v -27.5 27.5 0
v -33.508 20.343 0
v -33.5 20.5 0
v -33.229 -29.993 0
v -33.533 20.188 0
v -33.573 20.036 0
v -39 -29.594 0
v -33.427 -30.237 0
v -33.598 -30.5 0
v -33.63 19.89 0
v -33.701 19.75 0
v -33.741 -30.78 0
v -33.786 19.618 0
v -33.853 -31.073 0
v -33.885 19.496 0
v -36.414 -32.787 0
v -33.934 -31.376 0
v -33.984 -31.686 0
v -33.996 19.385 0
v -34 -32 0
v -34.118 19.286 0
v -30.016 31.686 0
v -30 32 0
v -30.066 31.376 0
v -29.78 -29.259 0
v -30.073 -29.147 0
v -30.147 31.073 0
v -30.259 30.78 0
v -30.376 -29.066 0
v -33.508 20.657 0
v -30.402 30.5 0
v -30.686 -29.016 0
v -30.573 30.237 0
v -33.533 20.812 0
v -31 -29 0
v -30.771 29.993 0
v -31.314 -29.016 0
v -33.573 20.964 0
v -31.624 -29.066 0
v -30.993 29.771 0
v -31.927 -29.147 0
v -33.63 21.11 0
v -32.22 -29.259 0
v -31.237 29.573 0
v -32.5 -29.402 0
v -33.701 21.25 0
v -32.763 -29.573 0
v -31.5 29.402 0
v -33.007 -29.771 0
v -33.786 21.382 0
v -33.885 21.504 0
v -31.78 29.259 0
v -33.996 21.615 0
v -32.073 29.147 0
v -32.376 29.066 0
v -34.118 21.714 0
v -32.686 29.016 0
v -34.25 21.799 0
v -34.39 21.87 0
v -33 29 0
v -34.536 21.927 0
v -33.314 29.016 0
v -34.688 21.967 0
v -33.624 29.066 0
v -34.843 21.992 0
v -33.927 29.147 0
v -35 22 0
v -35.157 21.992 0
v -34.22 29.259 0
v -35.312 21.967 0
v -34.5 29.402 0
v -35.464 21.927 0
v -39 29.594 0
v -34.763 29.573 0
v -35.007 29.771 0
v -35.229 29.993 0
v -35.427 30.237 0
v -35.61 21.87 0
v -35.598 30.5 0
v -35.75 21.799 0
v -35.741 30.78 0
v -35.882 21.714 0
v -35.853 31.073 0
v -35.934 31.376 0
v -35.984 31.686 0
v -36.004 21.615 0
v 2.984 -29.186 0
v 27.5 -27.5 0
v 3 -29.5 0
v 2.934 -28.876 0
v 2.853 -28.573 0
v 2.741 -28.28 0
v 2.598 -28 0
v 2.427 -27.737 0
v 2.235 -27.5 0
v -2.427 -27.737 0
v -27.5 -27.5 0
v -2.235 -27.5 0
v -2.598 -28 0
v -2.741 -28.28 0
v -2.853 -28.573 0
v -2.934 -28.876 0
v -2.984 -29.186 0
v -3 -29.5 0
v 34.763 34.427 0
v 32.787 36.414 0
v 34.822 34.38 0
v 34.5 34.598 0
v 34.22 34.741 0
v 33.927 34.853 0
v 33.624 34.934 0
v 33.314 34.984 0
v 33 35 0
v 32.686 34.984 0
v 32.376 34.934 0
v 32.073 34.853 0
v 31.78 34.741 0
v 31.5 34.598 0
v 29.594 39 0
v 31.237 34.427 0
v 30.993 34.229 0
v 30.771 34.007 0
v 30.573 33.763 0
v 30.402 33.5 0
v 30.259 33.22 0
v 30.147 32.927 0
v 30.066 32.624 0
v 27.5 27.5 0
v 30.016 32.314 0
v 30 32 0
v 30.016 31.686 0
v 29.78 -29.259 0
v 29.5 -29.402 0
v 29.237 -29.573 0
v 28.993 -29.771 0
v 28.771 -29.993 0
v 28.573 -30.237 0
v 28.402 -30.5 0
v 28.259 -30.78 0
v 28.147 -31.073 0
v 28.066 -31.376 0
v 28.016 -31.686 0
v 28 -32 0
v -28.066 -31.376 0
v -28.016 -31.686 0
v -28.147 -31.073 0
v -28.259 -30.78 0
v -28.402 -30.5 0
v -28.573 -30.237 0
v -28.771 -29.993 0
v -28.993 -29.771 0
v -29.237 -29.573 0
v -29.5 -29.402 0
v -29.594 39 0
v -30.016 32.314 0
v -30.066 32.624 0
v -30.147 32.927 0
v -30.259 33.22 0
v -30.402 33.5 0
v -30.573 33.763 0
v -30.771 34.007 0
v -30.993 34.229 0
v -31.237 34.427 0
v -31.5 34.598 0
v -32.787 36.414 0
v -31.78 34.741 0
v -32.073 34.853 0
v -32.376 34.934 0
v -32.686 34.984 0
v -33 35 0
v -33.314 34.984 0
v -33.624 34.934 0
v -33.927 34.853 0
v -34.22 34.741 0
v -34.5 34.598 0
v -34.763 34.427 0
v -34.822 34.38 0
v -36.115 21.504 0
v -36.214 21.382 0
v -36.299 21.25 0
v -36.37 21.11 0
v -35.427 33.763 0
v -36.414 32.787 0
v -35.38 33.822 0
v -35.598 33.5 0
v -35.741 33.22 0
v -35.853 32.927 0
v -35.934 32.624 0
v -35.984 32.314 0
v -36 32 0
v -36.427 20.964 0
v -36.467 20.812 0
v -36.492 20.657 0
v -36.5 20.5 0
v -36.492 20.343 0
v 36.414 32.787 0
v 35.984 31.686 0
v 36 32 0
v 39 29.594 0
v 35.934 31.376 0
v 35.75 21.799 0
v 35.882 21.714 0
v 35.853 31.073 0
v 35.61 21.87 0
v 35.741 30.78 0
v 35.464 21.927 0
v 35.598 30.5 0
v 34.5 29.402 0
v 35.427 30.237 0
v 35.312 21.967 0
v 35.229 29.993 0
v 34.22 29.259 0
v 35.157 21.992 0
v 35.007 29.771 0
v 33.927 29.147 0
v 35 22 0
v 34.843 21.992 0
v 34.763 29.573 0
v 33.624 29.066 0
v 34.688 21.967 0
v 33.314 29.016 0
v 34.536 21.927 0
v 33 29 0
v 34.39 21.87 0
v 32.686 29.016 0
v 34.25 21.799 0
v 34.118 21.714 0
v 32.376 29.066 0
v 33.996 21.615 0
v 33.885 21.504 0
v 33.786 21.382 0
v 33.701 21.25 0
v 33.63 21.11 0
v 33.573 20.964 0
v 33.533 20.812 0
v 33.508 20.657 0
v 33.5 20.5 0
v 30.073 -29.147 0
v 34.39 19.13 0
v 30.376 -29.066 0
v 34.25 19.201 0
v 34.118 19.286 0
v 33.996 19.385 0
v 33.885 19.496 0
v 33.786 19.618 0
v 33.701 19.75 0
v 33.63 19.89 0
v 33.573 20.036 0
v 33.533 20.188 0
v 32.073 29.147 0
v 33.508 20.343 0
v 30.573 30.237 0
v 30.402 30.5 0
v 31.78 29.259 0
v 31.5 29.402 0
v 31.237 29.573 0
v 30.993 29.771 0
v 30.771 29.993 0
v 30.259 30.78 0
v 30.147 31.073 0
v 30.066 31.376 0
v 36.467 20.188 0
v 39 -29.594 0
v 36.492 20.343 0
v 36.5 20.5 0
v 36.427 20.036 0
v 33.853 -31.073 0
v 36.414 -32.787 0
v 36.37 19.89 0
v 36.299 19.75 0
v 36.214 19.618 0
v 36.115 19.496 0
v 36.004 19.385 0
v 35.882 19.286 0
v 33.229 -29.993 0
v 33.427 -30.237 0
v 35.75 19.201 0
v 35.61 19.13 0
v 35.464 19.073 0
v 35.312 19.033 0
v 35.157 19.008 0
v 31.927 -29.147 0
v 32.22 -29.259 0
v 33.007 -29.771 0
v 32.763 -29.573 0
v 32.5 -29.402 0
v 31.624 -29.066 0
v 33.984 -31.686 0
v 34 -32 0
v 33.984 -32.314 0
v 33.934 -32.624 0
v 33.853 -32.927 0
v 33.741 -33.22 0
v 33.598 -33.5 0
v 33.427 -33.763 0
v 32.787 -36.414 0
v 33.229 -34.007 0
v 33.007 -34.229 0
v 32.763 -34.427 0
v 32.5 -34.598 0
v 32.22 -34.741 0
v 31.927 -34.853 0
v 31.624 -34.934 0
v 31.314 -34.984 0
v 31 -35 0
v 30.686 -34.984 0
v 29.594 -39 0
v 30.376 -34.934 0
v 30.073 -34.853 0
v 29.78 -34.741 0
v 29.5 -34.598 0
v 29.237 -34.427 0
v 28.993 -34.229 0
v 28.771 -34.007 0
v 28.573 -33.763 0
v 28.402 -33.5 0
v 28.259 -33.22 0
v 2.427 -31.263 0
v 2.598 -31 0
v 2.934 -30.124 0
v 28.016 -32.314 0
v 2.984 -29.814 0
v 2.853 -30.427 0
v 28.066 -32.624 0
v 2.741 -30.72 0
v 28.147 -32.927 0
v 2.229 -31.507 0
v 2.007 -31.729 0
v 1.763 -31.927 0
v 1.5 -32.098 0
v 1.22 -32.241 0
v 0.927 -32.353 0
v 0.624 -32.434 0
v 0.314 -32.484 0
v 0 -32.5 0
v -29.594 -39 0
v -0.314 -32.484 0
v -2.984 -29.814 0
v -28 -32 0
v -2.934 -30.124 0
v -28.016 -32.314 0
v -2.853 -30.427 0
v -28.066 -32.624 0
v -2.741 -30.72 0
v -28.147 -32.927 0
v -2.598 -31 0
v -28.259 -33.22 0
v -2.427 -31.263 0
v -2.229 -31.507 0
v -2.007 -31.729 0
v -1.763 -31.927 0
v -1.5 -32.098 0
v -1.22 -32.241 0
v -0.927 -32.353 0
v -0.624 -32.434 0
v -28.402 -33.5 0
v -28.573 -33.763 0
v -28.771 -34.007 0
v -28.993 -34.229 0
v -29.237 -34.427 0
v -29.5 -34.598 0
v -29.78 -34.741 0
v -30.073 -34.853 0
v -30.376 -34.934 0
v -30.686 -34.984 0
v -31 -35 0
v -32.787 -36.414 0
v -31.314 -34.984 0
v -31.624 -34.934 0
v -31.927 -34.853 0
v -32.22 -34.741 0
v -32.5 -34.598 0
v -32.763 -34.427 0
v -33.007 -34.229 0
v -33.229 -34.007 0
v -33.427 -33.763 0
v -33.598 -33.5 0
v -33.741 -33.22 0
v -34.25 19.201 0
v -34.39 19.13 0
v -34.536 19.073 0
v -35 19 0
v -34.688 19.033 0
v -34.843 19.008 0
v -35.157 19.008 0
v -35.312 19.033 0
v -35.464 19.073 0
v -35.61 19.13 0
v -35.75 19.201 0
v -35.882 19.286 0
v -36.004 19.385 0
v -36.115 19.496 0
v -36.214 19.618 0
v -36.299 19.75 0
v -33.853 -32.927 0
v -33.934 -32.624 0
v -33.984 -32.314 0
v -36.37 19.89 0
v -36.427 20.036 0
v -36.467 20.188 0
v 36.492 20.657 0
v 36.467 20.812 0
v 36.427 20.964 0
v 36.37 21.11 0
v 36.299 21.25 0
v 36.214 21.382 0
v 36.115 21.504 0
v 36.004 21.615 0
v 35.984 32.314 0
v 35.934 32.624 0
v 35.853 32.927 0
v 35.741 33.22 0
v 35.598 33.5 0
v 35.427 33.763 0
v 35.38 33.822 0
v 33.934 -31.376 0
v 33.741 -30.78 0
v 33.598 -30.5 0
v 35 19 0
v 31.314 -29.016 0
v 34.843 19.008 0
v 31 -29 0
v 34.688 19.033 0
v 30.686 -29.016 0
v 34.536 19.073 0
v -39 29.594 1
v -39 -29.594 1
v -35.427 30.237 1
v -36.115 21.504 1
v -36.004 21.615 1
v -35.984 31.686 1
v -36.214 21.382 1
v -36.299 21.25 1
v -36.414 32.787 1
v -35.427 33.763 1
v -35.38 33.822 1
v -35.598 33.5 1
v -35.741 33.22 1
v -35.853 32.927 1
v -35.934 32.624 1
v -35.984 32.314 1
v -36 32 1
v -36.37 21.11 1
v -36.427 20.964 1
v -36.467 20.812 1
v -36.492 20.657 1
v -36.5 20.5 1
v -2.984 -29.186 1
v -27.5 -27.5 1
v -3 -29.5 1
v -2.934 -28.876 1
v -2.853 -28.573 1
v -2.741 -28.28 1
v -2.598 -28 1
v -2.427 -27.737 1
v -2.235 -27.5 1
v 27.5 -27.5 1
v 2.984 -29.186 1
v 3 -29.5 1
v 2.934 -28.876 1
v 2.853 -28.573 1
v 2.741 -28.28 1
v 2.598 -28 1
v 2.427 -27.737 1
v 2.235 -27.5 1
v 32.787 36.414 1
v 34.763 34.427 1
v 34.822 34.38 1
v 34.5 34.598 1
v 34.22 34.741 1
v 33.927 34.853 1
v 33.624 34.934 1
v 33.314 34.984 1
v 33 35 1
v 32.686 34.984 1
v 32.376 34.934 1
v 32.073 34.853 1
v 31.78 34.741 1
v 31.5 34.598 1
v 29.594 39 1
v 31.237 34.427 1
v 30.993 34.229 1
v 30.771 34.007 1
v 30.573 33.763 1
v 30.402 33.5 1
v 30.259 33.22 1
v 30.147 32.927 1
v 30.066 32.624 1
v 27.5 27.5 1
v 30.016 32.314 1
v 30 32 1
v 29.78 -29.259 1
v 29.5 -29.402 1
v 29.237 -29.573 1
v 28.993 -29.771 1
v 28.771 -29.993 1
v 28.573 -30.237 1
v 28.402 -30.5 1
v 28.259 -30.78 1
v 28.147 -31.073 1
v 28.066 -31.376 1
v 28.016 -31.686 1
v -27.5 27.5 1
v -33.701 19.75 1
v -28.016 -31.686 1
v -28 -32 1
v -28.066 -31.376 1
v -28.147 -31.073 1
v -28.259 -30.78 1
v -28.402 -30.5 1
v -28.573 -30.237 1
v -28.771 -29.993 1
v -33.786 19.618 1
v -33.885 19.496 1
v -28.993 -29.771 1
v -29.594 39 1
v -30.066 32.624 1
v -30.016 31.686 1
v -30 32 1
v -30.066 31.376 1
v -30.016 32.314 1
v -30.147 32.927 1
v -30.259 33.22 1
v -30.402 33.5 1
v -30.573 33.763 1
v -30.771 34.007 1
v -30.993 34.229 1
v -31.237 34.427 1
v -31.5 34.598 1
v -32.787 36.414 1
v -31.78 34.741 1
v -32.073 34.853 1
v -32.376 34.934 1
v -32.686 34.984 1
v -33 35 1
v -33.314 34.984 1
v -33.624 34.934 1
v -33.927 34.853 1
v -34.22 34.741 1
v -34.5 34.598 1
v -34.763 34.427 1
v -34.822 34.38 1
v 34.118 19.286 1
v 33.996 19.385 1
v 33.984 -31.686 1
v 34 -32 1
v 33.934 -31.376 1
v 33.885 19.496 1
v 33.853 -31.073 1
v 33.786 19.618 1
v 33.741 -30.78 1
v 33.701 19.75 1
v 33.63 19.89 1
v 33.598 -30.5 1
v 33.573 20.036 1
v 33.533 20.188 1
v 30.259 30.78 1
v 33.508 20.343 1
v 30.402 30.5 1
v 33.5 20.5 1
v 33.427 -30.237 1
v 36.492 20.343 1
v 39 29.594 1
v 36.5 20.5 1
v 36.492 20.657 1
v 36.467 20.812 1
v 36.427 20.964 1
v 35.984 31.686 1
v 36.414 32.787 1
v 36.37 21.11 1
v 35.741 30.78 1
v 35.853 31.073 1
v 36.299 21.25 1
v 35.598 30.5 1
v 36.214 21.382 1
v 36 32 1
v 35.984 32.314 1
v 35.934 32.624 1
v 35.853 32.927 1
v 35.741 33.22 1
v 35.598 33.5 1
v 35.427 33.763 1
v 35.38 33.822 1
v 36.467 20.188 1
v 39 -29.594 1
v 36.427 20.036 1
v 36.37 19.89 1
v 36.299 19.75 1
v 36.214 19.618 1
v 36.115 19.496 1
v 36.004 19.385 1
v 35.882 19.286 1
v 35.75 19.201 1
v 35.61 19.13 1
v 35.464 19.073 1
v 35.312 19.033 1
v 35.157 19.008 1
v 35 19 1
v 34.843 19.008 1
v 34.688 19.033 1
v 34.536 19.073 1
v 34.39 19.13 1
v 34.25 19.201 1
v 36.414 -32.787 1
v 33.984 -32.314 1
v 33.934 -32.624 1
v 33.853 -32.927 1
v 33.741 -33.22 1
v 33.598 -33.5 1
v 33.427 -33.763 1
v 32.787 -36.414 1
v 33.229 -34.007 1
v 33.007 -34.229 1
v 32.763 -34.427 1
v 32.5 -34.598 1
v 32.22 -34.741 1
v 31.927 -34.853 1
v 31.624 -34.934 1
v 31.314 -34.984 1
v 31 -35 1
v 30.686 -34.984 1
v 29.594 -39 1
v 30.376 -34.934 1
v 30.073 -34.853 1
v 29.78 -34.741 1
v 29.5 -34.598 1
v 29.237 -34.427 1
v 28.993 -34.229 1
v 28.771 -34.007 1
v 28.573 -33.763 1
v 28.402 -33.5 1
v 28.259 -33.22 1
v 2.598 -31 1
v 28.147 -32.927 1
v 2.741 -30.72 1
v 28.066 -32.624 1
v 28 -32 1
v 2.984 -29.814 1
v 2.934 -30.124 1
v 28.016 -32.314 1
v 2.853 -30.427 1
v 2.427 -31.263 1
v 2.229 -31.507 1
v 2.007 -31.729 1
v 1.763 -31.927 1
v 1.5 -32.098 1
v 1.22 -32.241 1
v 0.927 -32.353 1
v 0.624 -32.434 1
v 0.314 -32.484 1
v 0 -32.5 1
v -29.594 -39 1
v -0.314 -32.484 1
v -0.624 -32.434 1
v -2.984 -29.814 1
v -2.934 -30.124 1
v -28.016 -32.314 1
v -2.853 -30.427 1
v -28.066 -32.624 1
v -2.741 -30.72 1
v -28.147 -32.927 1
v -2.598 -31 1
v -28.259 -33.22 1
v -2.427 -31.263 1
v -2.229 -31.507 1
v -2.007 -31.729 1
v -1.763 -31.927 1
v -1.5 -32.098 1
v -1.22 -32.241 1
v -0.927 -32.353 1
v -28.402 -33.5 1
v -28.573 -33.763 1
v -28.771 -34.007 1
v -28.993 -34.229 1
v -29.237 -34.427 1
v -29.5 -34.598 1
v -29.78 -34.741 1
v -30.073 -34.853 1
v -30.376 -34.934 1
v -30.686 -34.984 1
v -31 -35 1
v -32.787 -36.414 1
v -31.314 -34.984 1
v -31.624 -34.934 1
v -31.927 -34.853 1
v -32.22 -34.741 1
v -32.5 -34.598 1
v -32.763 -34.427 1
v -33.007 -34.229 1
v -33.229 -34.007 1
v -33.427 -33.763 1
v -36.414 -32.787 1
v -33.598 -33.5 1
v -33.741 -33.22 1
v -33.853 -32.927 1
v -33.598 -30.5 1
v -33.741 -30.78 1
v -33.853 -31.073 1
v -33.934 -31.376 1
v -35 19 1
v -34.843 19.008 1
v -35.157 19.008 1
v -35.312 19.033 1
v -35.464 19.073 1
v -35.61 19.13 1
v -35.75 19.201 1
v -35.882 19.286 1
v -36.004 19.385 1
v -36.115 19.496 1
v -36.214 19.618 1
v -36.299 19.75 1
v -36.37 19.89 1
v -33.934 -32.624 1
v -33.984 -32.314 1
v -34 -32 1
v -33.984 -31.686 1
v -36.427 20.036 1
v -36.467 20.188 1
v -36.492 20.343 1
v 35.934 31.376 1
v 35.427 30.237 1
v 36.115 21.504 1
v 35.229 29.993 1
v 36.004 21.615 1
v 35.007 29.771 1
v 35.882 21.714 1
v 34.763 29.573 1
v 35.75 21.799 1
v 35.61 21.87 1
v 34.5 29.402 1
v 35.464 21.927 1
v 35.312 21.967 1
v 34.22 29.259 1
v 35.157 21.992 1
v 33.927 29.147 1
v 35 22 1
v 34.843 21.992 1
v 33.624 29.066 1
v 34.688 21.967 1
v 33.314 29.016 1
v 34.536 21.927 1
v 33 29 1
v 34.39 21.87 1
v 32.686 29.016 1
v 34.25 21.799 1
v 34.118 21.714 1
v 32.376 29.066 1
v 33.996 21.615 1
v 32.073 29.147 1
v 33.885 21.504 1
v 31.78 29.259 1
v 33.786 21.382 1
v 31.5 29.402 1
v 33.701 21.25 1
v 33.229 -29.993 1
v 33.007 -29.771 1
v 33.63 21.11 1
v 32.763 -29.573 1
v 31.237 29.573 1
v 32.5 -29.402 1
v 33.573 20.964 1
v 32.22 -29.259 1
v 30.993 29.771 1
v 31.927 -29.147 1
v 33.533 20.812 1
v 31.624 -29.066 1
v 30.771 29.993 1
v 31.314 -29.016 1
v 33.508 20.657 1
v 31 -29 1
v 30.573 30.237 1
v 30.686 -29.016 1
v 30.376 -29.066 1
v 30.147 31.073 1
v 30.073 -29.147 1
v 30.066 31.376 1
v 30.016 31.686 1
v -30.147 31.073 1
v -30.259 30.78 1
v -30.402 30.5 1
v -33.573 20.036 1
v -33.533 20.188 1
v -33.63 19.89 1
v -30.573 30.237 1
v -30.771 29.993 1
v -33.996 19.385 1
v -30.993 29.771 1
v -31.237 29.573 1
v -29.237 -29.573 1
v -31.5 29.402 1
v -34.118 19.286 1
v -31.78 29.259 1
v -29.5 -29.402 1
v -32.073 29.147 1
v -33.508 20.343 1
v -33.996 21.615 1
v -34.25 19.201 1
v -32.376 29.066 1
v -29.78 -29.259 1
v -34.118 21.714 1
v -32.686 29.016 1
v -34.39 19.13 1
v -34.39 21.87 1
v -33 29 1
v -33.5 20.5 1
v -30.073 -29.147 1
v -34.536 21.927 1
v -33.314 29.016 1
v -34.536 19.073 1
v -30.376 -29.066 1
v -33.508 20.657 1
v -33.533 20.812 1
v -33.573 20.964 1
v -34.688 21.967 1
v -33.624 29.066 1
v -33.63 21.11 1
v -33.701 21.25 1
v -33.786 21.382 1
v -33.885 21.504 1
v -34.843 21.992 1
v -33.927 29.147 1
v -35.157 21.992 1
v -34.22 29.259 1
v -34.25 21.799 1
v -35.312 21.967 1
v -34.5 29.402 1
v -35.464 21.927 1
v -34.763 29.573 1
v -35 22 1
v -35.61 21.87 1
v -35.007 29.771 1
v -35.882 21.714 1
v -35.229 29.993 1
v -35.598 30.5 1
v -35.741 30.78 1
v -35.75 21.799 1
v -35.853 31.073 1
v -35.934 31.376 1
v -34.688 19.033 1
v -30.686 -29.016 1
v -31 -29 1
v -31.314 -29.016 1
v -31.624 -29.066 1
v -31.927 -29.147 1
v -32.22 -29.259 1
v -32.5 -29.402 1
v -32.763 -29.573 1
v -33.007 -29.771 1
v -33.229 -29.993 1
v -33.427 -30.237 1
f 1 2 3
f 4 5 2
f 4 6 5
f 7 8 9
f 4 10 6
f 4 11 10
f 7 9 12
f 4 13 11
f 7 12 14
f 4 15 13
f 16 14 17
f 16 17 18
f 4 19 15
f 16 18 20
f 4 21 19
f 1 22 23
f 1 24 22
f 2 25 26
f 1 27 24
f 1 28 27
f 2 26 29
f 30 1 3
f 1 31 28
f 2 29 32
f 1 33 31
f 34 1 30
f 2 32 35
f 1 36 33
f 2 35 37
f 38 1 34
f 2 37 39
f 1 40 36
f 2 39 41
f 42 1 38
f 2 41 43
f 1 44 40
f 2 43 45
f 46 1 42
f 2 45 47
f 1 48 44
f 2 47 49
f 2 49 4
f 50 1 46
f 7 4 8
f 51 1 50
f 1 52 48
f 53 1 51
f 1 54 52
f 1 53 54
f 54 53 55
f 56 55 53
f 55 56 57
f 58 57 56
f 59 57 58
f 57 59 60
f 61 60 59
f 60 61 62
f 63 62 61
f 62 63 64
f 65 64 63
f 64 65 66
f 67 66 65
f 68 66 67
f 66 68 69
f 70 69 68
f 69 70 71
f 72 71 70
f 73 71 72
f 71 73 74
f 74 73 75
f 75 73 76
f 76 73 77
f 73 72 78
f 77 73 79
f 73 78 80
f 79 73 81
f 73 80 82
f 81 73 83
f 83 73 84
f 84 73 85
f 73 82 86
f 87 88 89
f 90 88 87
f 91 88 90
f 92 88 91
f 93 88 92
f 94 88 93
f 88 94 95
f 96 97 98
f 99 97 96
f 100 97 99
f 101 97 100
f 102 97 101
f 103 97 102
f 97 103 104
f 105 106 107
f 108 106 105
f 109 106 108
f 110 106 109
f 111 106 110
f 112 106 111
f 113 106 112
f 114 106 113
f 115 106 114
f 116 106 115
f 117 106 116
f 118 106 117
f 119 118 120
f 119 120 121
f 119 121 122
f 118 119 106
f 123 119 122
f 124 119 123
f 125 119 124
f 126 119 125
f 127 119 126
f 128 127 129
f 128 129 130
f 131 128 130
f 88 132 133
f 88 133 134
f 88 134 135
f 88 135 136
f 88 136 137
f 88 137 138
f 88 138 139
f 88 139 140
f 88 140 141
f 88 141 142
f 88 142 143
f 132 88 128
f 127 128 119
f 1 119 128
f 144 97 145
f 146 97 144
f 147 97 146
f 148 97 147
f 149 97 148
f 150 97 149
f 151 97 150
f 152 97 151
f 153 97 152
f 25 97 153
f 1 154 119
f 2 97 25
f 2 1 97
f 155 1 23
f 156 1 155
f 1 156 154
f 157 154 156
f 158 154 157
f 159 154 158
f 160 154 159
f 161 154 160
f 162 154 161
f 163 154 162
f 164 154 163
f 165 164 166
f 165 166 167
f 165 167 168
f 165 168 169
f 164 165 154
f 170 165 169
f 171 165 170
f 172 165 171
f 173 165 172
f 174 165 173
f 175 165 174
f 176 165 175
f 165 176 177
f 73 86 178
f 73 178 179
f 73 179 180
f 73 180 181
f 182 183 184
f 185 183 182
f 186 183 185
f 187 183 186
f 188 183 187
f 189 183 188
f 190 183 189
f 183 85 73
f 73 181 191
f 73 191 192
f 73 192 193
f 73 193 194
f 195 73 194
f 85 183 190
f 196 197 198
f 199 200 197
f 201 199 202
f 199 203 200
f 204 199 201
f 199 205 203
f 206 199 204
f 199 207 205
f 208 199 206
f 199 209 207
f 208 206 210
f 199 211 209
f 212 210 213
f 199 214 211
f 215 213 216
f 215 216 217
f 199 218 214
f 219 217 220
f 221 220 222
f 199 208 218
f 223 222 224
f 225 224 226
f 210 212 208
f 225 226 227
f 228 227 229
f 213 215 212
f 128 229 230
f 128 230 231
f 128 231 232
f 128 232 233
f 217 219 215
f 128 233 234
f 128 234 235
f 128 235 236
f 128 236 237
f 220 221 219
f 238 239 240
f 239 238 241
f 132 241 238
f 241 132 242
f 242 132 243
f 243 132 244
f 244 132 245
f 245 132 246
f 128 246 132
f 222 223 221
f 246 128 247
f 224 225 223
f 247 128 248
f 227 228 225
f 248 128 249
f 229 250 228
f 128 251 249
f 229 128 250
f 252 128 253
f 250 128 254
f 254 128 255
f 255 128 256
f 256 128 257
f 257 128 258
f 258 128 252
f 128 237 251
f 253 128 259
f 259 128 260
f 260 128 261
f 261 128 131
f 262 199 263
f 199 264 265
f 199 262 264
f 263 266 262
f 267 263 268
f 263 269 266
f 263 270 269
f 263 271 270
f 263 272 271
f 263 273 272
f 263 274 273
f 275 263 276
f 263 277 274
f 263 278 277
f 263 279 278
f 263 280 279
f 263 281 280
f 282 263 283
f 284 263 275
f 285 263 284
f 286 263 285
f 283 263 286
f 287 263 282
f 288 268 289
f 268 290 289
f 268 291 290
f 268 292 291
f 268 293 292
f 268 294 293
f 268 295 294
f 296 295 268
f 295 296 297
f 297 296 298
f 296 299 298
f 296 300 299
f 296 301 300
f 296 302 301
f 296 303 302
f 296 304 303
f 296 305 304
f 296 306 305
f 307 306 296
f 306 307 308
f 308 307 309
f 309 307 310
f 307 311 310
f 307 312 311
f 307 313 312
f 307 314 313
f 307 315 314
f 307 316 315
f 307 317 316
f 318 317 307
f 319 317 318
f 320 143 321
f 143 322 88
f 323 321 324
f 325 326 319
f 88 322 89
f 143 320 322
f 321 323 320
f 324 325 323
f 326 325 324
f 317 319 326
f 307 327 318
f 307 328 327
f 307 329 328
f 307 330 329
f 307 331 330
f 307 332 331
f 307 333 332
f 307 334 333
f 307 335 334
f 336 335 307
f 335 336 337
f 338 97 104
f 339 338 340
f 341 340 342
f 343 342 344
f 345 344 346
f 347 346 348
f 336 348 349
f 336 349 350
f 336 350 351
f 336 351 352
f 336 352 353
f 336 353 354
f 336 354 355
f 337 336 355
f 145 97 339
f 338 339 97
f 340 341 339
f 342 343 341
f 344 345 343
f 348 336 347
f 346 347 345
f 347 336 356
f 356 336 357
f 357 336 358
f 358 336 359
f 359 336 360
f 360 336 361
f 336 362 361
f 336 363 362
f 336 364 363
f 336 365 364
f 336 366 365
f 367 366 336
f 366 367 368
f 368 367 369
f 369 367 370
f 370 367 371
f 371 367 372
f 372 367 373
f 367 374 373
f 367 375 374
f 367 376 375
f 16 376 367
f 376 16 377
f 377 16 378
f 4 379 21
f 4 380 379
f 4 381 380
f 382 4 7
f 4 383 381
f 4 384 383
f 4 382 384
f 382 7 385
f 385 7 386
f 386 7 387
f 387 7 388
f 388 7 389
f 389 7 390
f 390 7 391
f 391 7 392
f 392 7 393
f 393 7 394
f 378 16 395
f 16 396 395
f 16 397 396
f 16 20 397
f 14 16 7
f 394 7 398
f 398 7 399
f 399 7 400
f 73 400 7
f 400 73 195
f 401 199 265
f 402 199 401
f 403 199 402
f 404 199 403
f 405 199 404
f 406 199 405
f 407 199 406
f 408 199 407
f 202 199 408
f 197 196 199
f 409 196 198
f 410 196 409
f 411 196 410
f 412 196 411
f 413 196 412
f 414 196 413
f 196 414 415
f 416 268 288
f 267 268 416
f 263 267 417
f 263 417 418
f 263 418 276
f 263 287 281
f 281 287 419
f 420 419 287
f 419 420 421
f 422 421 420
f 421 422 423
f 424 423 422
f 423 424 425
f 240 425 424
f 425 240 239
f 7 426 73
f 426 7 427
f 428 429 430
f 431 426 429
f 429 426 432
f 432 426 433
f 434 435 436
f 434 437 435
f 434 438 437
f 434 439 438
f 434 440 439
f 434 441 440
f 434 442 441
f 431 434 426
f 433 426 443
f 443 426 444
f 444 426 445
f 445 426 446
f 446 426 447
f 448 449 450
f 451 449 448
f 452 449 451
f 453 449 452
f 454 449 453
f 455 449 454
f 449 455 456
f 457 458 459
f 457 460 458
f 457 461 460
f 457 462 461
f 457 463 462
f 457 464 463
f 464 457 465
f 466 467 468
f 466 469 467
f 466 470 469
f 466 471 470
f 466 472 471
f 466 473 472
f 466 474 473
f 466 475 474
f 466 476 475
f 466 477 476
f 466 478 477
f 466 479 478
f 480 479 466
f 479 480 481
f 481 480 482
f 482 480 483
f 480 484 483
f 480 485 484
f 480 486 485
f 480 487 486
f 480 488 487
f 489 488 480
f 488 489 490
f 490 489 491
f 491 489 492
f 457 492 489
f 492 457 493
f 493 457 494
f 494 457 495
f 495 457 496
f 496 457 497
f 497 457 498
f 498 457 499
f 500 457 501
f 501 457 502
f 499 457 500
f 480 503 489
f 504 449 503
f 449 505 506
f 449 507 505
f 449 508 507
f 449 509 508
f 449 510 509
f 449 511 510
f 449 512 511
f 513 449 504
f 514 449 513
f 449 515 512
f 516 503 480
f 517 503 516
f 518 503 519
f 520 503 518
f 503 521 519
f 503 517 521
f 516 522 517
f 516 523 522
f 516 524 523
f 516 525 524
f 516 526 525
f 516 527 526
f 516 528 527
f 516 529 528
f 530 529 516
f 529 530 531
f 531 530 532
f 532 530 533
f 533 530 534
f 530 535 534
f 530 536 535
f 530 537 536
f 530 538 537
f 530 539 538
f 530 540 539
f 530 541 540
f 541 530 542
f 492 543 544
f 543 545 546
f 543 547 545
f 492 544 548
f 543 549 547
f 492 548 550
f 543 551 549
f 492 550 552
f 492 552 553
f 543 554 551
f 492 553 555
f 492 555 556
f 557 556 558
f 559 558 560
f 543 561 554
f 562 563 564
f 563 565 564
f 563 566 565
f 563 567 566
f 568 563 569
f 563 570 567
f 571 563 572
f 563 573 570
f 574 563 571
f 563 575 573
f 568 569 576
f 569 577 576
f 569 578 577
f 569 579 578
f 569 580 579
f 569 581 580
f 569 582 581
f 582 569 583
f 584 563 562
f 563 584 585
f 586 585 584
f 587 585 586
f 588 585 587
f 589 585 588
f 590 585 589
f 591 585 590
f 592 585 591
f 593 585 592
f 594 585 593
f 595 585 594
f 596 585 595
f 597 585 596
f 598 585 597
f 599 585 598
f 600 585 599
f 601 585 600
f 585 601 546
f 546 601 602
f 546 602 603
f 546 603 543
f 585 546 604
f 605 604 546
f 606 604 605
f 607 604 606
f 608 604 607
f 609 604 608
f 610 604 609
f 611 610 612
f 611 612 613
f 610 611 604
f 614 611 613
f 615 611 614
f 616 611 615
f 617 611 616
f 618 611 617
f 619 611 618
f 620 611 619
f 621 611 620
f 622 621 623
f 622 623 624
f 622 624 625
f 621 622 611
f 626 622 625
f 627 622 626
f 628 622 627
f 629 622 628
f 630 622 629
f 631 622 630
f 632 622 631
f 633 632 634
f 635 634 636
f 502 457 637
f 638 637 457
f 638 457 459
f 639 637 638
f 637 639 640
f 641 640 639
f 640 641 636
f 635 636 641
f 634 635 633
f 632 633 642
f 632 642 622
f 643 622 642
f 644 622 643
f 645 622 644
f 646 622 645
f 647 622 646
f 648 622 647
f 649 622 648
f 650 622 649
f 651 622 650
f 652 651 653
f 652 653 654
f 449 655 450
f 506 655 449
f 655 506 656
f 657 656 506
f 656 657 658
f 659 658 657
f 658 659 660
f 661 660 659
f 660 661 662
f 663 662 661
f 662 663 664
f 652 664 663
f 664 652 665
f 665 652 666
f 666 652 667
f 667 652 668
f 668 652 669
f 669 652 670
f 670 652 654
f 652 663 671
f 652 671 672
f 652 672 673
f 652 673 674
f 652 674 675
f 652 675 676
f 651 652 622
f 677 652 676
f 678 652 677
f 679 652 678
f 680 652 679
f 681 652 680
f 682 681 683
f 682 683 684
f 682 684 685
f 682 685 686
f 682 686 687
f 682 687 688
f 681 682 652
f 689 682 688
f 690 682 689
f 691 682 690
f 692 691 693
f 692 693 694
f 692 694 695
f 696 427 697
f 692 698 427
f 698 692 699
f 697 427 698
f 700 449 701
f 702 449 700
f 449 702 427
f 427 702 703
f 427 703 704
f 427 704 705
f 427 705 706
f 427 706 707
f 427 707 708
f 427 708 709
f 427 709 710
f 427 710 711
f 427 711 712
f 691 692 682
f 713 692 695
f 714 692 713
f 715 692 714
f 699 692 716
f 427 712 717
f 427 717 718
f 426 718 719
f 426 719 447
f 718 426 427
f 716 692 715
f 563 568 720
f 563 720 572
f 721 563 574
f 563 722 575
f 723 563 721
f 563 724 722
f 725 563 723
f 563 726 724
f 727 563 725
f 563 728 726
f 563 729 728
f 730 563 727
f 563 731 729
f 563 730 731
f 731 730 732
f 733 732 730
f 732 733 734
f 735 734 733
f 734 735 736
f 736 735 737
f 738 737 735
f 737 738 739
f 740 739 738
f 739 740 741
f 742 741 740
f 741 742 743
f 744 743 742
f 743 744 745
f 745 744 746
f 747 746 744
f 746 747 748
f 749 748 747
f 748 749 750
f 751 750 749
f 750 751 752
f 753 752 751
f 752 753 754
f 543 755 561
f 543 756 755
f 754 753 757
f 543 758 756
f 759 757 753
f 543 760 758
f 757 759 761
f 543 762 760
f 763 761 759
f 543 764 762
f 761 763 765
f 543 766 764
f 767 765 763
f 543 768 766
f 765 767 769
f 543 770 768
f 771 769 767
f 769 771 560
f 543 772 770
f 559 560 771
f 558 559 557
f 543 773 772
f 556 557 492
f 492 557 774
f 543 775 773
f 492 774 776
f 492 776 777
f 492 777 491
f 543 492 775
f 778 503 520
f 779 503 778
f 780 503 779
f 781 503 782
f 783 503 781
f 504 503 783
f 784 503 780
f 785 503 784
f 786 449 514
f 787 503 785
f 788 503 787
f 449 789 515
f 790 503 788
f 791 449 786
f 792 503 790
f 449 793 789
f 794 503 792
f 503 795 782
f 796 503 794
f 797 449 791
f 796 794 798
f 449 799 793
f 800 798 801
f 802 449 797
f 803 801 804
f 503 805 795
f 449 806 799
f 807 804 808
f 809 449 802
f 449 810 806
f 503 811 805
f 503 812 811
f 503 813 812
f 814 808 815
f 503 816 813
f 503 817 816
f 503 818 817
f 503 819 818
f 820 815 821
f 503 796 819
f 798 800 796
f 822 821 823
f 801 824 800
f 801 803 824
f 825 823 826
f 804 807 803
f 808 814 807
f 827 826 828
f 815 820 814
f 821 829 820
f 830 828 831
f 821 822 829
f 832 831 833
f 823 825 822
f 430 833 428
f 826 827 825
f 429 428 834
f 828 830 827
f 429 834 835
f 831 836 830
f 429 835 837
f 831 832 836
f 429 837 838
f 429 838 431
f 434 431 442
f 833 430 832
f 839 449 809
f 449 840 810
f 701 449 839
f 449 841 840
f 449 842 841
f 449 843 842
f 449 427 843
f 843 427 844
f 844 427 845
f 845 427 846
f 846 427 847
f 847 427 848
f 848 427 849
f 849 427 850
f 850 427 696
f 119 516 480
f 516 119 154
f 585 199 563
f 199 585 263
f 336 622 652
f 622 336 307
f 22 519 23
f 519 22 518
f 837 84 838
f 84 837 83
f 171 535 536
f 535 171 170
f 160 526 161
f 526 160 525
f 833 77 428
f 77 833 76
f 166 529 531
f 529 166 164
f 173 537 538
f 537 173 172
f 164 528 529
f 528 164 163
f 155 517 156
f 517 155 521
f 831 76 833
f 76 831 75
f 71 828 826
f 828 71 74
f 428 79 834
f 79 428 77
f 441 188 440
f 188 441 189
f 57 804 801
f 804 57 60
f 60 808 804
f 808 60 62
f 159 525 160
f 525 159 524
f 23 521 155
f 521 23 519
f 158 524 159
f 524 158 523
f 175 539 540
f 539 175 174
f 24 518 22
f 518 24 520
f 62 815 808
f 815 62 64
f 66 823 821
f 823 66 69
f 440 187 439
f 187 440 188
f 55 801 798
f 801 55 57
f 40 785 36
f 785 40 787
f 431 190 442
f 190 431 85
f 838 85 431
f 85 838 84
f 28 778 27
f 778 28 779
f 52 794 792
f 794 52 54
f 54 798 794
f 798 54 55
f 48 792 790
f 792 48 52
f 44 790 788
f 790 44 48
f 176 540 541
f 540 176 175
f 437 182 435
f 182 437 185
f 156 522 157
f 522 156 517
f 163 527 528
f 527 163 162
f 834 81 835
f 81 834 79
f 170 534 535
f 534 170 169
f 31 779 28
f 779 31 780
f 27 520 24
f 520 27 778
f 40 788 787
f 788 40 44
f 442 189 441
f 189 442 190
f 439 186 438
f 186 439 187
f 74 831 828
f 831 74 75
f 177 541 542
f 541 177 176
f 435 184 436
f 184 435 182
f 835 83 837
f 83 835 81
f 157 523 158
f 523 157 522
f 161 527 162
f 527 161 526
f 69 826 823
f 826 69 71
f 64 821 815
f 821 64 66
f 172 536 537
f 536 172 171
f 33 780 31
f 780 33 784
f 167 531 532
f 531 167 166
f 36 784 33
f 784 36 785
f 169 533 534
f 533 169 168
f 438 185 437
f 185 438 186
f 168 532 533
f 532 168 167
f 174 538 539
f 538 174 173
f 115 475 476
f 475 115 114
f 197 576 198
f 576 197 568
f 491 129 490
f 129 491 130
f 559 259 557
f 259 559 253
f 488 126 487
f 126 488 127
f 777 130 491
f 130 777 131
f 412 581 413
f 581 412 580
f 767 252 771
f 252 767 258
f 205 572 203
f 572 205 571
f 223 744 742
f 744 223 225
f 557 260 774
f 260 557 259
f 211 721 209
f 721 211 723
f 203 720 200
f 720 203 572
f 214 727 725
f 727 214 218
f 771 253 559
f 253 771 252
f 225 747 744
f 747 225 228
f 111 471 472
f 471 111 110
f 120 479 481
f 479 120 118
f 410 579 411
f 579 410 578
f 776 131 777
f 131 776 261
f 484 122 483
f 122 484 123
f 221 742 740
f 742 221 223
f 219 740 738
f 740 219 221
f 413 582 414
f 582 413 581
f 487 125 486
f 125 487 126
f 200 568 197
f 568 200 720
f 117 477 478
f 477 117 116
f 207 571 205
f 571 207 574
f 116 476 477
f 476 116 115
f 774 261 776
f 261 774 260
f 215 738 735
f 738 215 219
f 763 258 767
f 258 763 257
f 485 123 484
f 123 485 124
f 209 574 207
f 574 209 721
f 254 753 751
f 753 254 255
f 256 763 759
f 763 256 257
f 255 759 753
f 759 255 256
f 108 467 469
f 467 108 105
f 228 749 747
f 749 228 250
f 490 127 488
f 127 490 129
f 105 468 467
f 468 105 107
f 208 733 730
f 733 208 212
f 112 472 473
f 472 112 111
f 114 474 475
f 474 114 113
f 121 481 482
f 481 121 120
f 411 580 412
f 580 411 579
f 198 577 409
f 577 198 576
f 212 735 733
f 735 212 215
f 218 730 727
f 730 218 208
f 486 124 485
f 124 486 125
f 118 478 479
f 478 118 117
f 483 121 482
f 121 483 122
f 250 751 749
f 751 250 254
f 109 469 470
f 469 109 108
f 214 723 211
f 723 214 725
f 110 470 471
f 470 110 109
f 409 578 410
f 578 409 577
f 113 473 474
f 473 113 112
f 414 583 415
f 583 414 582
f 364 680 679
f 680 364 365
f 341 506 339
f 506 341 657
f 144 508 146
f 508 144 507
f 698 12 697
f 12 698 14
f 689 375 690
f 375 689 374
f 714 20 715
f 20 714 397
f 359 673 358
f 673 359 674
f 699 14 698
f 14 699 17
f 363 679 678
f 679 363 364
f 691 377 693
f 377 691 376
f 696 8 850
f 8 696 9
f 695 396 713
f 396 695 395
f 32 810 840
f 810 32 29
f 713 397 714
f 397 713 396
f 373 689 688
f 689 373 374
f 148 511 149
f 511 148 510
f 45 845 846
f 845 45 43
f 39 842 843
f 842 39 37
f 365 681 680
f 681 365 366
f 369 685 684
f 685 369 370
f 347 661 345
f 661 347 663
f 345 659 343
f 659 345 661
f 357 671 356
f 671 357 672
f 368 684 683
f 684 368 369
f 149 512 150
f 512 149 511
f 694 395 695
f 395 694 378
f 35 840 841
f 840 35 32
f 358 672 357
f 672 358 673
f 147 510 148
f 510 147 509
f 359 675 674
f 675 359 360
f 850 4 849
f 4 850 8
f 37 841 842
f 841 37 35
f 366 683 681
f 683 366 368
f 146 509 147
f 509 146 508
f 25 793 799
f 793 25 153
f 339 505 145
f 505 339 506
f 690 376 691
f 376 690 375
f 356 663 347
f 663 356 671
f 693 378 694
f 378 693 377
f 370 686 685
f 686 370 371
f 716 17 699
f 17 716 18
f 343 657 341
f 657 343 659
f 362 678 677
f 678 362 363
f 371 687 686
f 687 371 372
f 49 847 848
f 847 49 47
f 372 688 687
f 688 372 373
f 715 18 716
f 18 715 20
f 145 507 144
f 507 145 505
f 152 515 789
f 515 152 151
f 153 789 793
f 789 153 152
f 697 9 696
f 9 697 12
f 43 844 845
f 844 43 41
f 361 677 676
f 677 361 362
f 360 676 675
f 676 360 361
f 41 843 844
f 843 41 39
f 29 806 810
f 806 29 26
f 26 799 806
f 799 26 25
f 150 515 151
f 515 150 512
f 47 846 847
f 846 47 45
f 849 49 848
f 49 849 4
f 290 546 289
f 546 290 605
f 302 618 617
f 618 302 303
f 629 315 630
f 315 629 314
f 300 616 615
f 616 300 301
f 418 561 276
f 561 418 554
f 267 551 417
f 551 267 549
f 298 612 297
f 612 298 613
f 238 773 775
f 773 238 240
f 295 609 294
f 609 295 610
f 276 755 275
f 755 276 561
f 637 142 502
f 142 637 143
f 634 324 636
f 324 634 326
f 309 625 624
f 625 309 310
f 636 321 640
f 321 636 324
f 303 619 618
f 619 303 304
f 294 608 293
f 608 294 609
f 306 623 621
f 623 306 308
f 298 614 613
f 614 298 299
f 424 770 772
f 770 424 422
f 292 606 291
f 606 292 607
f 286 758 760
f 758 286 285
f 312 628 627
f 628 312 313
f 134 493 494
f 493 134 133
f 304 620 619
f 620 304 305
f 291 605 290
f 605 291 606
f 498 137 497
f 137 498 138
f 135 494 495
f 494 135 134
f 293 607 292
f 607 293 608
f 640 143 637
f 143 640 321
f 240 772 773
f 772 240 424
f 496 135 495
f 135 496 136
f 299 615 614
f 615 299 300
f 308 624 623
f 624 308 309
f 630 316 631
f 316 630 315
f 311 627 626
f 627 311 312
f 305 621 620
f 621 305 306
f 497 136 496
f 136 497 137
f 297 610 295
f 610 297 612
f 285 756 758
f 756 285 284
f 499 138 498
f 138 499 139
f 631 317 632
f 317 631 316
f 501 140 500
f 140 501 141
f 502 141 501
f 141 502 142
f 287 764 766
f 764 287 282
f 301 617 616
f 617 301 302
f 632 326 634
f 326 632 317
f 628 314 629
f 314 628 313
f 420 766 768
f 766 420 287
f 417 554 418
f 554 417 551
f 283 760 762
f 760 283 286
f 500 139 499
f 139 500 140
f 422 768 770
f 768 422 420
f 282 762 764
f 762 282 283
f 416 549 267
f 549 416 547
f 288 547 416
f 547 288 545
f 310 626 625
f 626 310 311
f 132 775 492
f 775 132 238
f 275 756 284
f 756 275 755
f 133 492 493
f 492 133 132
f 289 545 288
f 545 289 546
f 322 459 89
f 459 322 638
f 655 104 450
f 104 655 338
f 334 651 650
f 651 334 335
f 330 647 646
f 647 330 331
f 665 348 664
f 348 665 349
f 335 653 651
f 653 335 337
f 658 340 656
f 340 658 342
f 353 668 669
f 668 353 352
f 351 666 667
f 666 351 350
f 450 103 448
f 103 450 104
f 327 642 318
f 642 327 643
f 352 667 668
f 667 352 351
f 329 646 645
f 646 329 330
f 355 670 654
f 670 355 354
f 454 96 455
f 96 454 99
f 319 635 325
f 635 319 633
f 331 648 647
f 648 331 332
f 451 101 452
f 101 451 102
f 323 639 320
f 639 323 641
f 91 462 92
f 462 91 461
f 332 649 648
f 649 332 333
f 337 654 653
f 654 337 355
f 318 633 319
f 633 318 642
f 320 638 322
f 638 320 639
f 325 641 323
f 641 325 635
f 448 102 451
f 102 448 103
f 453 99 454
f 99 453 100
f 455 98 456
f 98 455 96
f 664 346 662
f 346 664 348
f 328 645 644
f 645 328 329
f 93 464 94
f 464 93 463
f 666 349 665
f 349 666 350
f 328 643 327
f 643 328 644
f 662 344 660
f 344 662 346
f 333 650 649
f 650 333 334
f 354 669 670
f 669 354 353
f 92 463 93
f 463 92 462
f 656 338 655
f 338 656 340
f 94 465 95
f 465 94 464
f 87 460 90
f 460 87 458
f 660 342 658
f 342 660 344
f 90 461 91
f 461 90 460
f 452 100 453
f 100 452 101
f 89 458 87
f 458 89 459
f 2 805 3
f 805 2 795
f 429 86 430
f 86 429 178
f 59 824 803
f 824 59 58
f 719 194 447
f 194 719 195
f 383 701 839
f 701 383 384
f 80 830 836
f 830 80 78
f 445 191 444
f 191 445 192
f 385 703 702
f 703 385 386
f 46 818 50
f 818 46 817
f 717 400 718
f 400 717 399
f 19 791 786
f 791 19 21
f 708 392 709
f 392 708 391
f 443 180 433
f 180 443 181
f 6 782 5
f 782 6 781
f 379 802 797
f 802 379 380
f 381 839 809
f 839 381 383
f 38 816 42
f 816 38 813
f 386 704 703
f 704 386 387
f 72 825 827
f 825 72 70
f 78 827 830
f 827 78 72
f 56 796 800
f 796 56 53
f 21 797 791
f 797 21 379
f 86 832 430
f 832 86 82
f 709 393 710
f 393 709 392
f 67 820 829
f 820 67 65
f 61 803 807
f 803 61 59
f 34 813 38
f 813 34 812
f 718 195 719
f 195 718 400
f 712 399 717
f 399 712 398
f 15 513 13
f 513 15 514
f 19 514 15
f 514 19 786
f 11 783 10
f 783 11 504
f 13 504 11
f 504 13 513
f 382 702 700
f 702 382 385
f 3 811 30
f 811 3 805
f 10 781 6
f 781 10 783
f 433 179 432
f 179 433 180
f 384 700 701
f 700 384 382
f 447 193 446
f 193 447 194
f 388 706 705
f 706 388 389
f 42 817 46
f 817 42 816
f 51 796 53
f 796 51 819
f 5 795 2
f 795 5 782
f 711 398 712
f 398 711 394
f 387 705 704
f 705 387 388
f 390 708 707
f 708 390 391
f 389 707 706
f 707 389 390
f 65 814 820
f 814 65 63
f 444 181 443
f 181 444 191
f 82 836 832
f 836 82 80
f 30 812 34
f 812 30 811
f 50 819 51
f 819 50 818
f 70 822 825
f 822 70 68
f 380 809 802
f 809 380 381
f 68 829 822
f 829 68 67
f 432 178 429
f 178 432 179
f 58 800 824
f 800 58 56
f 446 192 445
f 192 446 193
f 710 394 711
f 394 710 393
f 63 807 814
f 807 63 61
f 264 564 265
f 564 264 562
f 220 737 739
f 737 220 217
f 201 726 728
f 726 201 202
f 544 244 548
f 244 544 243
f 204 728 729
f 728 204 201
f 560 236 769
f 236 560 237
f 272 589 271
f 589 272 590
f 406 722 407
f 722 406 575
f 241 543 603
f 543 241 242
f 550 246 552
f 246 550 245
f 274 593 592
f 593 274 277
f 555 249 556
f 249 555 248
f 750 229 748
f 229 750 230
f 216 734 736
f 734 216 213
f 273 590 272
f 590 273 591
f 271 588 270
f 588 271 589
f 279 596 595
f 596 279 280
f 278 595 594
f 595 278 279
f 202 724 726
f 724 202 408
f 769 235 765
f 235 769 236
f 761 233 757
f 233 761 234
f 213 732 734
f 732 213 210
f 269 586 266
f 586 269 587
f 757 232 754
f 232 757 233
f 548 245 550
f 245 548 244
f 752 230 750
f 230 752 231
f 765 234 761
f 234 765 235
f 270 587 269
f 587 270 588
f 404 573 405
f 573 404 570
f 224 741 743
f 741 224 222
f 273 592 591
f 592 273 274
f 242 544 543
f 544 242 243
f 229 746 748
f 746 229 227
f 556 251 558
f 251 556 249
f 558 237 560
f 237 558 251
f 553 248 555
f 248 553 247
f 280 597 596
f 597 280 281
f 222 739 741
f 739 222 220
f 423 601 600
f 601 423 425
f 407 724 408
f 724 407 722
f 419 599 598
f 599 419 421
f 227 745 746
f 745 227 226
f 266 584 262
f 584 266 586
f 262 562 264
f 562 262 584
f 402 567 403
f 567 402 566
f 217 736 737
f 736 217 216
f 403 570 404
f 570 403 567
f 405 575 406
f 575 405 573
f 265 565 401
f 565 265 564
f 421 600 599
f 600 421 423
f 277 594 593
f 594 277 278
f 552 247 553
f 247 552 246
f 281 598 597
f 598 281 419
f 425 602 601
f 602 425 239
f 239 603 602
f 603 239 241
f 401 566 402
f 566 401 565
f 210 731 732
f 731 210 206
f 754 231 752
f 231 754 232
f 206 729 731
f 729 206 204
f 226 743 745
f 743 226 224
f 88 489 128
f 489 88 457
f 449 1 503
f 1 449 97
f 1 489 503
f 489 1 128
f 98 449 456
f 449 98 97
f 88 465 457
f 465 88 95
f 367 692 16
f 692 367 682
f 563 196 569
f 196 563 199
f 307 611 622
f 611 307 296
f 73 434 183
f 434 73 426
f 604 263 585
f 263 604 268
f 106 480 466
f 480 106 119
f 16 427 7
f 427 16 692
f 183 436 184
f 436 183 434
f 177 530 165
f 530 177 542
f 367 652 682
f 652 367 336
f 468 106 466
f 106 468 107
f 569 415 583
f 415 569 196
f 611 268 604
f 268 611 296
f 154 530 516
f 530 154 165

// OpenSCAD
$fn=60;

led_board_radius=5.05;
led_board_height=1;

board_radius=78/2;
board_height=1;

through_hole_radius=3;
screw_hole_radius=1.5;

intersection() {
  difference() {
    // The basic square for the 'board'
    linear_extrude(board_height) square(board_radius*2, center=true);
    
    // Subtract out the led holes
    *union() {
      sectors = 24;
      sector_degrees = 360 / sectors;
      for(sector = [1 : sectors]) {
        angle = sector_degrees * (sector+0.5);
        // Polar equ for 'squircle', awesome: https://thatsmaths.com/2016/07/14/squircles/
        radius = (1 + 1/8 * sin(2*angle)*sin(2*angle)) * (board_radius-led_board_radius);
        
        rotate([0, 0, angle])
          translate([radius, 0, -1])
          led_board();
      }
    }

    // Subtract out the inner circle
    translate([0, 0, -1]) 
      linear_extrude(board_height+2)
      circle(board_radius-15);
  
    // top left through hole
    translate([
        -(board_radius-(3+through_hole_radius)), 
        (board_radius-(4+through_hole_radius)),
        -1]) 
      linear_extrude(board_height+2)
      circle(through_hole_radius);
    // top right through hole
    translate([
        (board_radius-(3+through_hole_radius)), 
        (board_radius-(4+through_hole_radius)),
        -1]) 
      linear_extrude(board_height+2)
      circle(through_hole_radius);
    // bottom left through hole
    translate([
        -(board_radius-(5+through_hole_radius)), 
        -(board_radius-(4+through_hole_radius)),
        -1]) 
      linear_extrude(board_height+2)
      circle(through_hole_radius);
    // bottom right through hole
    translate([
        (board_radius-(5+through_hole_radius)), 
        -(board_radius-(4+through_hole_radius)),
        -1])
      linear_extrude(board_height+2)
      circle(through_hole_radius);
    // bottom middle through hole
    translate([
        0, 
        -(board_radius-(6.5+through_hole_radius)),
        -1]) 
      linear_extrude(board_height+2)
      circle(through_hole_radius);

    // top left screw hole
    translate([
        -(board_radius-(2.5+screw_hole_radius)), 
        (board_radius-(17+screw_hole_radius)),
        -1]) 
      linear_extrude(board_height+2)
      circle(screw_hole_radius);
    // top right screw hole
    translate([
        (board_radius-(2.5+screw_hole_radius)), 
        (board_radius-(17+screw_hole_radius)),
        -1]) 
      linear_extrude(board_height+2)
      circle(screw_hole_radius);
    cube(55, center=true);
  }
  
  // intersect to subtract the outer circle
  translate([0, 0, -1]) 
    linear_extrude(board_height+2)
    circle(board_radius+10);
}

/** Draw the led board centered on the plane with extra height */
module led_board() {
  linear_extrude(led_board_height+1)
    circle(led_board_radius);
  linear_extrude(board_height+2)
    square(5.5, center=true);
  translate([0, 0, 2])
    cube([2*led_board_radius, 5, board_height], center=true);
}
